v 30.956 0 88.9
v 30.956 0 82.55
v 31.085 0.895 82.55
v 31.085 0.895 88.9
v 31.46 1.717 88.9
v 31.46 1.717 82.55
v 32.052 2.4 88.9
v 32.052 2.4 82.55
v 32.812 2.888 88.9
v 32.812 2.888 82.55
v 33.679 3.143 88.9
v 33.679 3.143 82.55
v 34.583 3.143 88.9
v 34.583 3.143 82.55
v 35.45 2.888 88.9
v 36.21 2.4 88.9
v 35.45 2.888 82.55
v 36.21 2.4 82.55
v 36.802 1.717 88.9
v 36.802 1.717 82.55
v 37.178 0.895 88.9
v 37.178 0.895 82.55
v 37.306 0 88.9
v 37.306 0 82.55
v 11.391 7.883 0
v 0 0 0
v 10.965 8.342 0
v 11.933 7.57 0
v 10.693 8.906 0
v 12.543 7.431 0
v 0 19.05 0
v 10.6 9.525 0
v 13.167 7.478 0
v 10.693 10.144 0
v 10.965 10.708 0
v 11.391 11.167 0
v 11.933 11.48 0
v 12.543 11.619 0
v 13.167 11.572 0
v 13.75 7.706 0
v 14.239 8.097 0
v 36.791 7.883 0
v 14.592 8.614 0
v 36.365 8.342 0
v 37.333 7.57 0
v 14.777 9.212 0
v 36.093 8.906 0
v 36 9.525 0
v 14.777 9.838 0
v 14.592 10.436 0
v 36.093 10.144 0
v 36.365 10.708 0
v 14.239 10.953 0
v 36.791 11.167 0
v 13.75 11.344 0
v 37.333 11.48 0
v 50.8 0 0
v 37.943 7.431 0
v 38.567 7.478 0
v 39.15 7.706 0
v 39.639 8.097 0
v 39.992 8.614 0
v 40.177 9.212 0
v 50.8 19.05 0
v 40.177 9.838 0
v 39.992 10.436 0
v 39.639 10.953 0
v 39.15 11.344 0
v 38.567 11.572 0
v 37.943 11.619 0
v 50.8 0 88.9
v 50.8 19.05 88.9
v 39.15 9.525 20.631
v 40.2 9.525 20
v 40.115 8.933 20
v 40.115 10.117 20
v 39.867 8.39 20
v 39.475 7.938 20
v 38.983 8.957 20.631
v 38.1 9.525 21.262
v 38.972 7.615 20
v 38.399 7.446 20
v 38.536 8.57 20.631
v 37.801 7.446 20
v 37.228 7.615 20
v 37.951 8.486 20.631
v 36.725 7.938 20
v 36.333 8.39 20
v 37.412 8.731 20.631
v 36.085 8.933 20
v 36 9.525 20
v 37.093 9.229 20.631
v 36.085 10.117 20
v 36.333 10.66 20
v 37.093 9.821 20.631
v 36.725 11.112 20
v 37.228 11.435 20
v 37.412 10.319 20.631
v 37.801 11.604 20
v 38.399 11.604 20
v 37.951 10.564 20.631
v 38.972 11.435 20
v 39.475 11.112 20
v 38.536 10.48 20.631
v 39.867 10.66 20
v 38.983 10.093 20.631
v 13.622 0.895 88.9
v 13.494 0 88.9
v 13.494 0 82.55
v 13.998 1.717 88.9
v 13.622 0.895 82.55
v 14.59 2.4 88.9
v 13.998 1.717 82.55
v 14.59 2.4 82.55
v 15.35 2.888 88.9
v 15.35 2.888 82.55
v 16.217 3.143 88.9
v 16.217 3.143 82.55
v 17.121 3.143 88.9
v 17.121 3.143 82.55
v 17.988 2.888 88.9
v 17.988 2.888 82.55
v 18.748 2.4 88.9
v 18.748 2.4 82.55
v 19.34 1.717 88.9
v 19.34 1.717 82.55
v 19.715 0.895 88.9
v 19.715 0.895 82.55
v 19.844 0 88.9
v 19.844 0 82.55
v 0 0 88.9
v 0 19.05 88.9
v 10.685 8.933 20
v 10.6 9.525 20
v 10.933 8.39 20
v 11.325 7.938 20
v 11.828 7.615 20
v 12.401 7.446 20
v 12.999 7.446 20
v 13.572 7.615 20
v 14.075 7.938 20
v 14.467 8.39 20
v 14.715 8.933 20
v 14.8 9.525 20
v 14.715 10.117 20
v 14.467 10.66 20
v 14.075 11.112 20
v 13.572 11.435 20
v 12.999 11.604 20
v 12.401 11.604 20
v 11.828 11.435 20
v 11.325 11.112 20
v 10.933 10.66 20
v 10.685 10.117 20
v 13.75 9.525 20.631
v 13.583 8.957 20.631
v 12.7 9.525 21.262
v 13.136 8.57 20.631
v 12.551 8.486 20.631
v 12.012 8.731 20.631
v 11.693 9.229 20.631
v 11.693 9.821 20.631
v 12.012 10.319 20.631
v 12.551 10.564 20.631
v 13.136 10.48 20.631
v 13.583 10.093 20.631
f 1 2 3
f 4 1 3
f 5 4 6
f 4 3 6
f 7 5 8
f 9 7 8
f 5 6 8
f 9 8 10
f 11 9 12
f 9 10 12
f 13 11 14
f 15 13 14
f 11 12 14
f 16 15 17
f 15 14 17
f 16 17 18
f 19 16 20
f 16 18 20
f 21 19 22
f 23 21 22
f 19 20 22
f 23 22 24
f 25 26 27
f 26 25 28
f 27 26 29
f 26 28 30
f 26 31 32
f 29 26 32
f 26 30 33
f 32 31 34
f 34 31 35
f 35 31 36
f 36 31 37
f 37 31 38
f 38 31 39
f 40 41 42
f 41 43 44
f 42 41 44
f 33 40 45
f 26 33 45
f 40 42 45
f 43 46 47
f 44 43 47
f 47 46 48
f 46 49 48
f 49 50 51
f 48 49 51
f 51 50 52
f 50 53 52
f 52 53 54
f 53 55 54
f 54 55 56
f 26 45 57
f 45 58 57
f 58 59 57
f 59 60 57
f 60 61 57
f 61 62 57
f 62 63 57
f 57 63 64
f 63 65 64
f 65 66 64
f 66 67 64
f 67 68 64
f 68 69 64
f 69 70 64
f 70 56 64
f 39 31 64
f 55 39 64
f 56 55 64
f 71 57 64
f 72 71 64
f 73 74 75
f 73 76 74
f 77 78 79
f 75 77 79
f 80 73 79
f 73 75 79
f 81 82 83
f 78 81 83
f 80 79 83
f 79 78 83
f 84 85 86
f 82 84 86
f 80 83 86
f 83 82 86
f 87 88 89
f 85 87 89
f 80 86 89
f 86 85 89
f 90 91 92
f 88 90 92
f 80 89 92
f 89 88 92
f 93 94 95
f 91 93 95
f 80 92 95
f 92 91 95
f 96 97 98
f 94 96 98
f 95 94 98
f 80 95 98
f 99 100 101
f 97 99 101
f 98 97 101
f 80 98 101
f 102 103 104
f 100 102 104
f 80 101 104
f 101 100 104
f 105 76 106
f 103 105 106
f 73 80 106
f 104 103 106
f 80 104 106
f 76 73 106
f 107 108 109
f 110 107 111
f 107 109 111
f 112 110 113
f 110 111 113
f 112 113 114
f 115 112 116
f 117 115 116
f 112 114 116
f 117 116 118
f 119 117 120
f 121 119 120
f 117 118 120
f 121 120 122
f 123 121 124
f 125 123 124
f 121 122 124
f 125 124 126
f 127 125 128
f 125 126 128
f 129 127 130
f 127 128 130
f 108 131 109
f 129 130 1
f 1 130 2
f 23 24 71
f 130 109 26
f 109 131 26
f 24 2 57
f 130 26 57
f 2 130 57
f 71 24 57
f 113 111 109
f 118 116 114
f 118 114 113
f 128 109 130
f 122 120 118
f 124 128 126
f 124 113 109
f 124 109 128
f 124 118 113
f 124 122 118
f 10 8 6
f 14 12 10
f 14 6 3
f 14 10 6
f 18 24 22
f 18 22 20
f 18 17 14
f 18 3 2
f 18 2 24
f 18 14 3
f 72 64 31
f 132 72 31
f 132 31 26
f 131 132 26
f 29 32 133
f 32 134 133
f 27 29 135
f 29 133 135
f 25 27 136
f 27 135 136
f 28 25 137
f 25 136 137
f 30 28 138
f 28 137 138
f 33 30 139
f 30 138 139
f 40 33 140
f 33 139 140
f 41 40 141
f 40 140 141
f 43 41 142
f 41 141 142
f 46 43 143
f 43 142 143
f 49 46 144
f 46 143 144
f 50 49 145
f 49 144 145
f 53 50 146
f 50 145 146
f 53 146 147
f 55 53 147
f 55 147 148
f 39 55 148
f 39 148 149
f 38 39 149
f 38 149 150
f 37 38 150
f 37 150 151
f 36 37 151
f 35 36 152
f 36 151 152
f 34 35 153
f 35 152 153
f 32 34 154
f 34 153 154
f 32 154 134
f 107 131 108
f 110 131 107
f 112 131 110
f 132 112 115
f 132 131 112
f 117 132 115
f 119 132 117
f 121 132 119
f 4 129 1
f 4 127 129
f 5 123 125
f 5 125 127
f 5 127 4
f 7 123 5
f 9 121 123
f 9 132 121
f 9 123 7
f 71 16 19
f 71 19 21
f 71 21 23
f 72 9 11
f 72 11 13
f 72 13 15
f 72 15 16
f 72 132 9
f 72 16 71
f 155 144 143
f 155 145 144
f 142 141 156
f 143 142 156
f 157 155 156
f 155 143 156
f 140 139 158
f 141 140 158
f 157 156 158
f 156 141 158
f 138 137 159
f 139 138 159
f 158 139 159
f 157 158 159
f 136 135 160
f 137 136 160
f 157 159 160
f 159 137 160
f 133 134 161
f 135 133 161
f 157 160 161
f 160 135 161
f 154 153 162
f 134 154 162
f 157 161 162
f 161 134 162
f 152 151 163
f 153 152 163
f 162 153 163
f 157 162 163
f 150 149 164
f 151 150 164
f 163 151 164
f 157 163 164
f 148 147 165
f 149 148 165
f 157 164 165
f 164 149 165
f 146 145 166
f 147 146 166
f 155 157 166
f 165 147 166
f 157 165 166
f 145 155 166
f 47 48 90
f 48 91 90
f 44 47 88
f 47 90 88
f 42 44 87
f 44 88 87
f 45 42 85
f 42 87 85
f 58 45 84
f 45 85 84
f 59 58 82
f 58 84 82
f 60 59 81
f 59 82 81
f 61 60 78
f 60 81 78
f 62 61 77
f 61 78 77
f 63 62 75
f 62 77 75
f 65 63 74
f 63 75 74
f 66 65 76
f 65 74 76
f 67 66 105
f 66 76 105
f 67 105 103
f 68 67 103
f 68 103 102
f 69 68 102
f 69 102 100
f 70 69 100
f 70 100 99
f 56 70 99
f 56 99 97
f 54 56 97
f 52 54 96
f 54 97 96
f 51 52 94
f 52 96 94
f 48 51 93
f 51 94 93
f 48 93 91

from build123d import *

# Parameters (mm, degrees)
F0_R     = 2.5
F1_DEPTH = 88.9
F2_DEPTH = 82.55
F3_D     = 4.2
F3_DEPTH = 20
F3_TIP   = 1.2618073


with BuildPart() as f1:
    # F0 (on Top) → F1 (new body)
    with BuildSketch(Plane.XY):
        with BuildLine():
            Line((19.84375, 0), (25.4, 0))
            Line((25.4, 0), (30.95625, 0))
            ThreePointArc((30.95625, 0), (34.13125, 3.175), (37.30625, 0))
            Line((37.30625, 0), (50.8, 0))
            Line((50.8, 0), (50.8, 19.05))
            Line((50.8, 19.05), (25.4, 19.05))
            Line((25.4, 19.05), (0, 19.05))
            Line((0, 19.05), (0, 0))
            Line((0, 0), (13.49375, 0))
            ThreePointArc((13.49375, 0), (16.66875, 3.175), (19.84375, 0))
        make_face()
        with Locations((12.7, 9.525)):
            Circle(F0_R, mode=Mode.SUBTRACT)
        with Locations((38.1, 9.525)):
            Circle(F0_R, mode=Mode.SUBTRACT)
        with Locations((12.7, 9.525)):
            Circle(F0_R)
        with Locations((38.1, 9.525)):
            Circle(F0_R)
    extrude(amount=F1_DEPTH)

    # F0 (on Top) → F2 (join)
    with BuildSketch(Plane.XY):
        with BuildLine():
            Line((16.66875, 0), (19.84375, 0))
            ThreePointArc((19.84375, 0), (16.66875, 3.175), (13.49375, 0))
            Line((13.49375, 0), (16.66875, 0))
        make_face()
        with BuildLine():
            ThreePointArc((37.30625, 0), (34.13125, 3.175), (30.95625, 0))
            Line((30.95625, 0), (34.13125, 0))
            Line((34.13125, 0), (37.30625, 0))
        make_face()
    extrude(amount=F2_DEPTH)

    # F3
    with Locations(Plane(origin=(0, 0, 0), x_dir=(1, 0, 0), z_dir=(0, 0, -1))):
        with Locations((12.7, -9.525), (38.1, -9.525)):
            Hole(F3_D / 2, depth=F3_DEPTH)
            with Locations((0, 0, -(F3_DEPTH + F3_TIP / 2))):  # 118° drill point
                Cone(0, F3_D / 2, F3_TIP, mode=Mode.SUBTRACT)


solid = f1.part
